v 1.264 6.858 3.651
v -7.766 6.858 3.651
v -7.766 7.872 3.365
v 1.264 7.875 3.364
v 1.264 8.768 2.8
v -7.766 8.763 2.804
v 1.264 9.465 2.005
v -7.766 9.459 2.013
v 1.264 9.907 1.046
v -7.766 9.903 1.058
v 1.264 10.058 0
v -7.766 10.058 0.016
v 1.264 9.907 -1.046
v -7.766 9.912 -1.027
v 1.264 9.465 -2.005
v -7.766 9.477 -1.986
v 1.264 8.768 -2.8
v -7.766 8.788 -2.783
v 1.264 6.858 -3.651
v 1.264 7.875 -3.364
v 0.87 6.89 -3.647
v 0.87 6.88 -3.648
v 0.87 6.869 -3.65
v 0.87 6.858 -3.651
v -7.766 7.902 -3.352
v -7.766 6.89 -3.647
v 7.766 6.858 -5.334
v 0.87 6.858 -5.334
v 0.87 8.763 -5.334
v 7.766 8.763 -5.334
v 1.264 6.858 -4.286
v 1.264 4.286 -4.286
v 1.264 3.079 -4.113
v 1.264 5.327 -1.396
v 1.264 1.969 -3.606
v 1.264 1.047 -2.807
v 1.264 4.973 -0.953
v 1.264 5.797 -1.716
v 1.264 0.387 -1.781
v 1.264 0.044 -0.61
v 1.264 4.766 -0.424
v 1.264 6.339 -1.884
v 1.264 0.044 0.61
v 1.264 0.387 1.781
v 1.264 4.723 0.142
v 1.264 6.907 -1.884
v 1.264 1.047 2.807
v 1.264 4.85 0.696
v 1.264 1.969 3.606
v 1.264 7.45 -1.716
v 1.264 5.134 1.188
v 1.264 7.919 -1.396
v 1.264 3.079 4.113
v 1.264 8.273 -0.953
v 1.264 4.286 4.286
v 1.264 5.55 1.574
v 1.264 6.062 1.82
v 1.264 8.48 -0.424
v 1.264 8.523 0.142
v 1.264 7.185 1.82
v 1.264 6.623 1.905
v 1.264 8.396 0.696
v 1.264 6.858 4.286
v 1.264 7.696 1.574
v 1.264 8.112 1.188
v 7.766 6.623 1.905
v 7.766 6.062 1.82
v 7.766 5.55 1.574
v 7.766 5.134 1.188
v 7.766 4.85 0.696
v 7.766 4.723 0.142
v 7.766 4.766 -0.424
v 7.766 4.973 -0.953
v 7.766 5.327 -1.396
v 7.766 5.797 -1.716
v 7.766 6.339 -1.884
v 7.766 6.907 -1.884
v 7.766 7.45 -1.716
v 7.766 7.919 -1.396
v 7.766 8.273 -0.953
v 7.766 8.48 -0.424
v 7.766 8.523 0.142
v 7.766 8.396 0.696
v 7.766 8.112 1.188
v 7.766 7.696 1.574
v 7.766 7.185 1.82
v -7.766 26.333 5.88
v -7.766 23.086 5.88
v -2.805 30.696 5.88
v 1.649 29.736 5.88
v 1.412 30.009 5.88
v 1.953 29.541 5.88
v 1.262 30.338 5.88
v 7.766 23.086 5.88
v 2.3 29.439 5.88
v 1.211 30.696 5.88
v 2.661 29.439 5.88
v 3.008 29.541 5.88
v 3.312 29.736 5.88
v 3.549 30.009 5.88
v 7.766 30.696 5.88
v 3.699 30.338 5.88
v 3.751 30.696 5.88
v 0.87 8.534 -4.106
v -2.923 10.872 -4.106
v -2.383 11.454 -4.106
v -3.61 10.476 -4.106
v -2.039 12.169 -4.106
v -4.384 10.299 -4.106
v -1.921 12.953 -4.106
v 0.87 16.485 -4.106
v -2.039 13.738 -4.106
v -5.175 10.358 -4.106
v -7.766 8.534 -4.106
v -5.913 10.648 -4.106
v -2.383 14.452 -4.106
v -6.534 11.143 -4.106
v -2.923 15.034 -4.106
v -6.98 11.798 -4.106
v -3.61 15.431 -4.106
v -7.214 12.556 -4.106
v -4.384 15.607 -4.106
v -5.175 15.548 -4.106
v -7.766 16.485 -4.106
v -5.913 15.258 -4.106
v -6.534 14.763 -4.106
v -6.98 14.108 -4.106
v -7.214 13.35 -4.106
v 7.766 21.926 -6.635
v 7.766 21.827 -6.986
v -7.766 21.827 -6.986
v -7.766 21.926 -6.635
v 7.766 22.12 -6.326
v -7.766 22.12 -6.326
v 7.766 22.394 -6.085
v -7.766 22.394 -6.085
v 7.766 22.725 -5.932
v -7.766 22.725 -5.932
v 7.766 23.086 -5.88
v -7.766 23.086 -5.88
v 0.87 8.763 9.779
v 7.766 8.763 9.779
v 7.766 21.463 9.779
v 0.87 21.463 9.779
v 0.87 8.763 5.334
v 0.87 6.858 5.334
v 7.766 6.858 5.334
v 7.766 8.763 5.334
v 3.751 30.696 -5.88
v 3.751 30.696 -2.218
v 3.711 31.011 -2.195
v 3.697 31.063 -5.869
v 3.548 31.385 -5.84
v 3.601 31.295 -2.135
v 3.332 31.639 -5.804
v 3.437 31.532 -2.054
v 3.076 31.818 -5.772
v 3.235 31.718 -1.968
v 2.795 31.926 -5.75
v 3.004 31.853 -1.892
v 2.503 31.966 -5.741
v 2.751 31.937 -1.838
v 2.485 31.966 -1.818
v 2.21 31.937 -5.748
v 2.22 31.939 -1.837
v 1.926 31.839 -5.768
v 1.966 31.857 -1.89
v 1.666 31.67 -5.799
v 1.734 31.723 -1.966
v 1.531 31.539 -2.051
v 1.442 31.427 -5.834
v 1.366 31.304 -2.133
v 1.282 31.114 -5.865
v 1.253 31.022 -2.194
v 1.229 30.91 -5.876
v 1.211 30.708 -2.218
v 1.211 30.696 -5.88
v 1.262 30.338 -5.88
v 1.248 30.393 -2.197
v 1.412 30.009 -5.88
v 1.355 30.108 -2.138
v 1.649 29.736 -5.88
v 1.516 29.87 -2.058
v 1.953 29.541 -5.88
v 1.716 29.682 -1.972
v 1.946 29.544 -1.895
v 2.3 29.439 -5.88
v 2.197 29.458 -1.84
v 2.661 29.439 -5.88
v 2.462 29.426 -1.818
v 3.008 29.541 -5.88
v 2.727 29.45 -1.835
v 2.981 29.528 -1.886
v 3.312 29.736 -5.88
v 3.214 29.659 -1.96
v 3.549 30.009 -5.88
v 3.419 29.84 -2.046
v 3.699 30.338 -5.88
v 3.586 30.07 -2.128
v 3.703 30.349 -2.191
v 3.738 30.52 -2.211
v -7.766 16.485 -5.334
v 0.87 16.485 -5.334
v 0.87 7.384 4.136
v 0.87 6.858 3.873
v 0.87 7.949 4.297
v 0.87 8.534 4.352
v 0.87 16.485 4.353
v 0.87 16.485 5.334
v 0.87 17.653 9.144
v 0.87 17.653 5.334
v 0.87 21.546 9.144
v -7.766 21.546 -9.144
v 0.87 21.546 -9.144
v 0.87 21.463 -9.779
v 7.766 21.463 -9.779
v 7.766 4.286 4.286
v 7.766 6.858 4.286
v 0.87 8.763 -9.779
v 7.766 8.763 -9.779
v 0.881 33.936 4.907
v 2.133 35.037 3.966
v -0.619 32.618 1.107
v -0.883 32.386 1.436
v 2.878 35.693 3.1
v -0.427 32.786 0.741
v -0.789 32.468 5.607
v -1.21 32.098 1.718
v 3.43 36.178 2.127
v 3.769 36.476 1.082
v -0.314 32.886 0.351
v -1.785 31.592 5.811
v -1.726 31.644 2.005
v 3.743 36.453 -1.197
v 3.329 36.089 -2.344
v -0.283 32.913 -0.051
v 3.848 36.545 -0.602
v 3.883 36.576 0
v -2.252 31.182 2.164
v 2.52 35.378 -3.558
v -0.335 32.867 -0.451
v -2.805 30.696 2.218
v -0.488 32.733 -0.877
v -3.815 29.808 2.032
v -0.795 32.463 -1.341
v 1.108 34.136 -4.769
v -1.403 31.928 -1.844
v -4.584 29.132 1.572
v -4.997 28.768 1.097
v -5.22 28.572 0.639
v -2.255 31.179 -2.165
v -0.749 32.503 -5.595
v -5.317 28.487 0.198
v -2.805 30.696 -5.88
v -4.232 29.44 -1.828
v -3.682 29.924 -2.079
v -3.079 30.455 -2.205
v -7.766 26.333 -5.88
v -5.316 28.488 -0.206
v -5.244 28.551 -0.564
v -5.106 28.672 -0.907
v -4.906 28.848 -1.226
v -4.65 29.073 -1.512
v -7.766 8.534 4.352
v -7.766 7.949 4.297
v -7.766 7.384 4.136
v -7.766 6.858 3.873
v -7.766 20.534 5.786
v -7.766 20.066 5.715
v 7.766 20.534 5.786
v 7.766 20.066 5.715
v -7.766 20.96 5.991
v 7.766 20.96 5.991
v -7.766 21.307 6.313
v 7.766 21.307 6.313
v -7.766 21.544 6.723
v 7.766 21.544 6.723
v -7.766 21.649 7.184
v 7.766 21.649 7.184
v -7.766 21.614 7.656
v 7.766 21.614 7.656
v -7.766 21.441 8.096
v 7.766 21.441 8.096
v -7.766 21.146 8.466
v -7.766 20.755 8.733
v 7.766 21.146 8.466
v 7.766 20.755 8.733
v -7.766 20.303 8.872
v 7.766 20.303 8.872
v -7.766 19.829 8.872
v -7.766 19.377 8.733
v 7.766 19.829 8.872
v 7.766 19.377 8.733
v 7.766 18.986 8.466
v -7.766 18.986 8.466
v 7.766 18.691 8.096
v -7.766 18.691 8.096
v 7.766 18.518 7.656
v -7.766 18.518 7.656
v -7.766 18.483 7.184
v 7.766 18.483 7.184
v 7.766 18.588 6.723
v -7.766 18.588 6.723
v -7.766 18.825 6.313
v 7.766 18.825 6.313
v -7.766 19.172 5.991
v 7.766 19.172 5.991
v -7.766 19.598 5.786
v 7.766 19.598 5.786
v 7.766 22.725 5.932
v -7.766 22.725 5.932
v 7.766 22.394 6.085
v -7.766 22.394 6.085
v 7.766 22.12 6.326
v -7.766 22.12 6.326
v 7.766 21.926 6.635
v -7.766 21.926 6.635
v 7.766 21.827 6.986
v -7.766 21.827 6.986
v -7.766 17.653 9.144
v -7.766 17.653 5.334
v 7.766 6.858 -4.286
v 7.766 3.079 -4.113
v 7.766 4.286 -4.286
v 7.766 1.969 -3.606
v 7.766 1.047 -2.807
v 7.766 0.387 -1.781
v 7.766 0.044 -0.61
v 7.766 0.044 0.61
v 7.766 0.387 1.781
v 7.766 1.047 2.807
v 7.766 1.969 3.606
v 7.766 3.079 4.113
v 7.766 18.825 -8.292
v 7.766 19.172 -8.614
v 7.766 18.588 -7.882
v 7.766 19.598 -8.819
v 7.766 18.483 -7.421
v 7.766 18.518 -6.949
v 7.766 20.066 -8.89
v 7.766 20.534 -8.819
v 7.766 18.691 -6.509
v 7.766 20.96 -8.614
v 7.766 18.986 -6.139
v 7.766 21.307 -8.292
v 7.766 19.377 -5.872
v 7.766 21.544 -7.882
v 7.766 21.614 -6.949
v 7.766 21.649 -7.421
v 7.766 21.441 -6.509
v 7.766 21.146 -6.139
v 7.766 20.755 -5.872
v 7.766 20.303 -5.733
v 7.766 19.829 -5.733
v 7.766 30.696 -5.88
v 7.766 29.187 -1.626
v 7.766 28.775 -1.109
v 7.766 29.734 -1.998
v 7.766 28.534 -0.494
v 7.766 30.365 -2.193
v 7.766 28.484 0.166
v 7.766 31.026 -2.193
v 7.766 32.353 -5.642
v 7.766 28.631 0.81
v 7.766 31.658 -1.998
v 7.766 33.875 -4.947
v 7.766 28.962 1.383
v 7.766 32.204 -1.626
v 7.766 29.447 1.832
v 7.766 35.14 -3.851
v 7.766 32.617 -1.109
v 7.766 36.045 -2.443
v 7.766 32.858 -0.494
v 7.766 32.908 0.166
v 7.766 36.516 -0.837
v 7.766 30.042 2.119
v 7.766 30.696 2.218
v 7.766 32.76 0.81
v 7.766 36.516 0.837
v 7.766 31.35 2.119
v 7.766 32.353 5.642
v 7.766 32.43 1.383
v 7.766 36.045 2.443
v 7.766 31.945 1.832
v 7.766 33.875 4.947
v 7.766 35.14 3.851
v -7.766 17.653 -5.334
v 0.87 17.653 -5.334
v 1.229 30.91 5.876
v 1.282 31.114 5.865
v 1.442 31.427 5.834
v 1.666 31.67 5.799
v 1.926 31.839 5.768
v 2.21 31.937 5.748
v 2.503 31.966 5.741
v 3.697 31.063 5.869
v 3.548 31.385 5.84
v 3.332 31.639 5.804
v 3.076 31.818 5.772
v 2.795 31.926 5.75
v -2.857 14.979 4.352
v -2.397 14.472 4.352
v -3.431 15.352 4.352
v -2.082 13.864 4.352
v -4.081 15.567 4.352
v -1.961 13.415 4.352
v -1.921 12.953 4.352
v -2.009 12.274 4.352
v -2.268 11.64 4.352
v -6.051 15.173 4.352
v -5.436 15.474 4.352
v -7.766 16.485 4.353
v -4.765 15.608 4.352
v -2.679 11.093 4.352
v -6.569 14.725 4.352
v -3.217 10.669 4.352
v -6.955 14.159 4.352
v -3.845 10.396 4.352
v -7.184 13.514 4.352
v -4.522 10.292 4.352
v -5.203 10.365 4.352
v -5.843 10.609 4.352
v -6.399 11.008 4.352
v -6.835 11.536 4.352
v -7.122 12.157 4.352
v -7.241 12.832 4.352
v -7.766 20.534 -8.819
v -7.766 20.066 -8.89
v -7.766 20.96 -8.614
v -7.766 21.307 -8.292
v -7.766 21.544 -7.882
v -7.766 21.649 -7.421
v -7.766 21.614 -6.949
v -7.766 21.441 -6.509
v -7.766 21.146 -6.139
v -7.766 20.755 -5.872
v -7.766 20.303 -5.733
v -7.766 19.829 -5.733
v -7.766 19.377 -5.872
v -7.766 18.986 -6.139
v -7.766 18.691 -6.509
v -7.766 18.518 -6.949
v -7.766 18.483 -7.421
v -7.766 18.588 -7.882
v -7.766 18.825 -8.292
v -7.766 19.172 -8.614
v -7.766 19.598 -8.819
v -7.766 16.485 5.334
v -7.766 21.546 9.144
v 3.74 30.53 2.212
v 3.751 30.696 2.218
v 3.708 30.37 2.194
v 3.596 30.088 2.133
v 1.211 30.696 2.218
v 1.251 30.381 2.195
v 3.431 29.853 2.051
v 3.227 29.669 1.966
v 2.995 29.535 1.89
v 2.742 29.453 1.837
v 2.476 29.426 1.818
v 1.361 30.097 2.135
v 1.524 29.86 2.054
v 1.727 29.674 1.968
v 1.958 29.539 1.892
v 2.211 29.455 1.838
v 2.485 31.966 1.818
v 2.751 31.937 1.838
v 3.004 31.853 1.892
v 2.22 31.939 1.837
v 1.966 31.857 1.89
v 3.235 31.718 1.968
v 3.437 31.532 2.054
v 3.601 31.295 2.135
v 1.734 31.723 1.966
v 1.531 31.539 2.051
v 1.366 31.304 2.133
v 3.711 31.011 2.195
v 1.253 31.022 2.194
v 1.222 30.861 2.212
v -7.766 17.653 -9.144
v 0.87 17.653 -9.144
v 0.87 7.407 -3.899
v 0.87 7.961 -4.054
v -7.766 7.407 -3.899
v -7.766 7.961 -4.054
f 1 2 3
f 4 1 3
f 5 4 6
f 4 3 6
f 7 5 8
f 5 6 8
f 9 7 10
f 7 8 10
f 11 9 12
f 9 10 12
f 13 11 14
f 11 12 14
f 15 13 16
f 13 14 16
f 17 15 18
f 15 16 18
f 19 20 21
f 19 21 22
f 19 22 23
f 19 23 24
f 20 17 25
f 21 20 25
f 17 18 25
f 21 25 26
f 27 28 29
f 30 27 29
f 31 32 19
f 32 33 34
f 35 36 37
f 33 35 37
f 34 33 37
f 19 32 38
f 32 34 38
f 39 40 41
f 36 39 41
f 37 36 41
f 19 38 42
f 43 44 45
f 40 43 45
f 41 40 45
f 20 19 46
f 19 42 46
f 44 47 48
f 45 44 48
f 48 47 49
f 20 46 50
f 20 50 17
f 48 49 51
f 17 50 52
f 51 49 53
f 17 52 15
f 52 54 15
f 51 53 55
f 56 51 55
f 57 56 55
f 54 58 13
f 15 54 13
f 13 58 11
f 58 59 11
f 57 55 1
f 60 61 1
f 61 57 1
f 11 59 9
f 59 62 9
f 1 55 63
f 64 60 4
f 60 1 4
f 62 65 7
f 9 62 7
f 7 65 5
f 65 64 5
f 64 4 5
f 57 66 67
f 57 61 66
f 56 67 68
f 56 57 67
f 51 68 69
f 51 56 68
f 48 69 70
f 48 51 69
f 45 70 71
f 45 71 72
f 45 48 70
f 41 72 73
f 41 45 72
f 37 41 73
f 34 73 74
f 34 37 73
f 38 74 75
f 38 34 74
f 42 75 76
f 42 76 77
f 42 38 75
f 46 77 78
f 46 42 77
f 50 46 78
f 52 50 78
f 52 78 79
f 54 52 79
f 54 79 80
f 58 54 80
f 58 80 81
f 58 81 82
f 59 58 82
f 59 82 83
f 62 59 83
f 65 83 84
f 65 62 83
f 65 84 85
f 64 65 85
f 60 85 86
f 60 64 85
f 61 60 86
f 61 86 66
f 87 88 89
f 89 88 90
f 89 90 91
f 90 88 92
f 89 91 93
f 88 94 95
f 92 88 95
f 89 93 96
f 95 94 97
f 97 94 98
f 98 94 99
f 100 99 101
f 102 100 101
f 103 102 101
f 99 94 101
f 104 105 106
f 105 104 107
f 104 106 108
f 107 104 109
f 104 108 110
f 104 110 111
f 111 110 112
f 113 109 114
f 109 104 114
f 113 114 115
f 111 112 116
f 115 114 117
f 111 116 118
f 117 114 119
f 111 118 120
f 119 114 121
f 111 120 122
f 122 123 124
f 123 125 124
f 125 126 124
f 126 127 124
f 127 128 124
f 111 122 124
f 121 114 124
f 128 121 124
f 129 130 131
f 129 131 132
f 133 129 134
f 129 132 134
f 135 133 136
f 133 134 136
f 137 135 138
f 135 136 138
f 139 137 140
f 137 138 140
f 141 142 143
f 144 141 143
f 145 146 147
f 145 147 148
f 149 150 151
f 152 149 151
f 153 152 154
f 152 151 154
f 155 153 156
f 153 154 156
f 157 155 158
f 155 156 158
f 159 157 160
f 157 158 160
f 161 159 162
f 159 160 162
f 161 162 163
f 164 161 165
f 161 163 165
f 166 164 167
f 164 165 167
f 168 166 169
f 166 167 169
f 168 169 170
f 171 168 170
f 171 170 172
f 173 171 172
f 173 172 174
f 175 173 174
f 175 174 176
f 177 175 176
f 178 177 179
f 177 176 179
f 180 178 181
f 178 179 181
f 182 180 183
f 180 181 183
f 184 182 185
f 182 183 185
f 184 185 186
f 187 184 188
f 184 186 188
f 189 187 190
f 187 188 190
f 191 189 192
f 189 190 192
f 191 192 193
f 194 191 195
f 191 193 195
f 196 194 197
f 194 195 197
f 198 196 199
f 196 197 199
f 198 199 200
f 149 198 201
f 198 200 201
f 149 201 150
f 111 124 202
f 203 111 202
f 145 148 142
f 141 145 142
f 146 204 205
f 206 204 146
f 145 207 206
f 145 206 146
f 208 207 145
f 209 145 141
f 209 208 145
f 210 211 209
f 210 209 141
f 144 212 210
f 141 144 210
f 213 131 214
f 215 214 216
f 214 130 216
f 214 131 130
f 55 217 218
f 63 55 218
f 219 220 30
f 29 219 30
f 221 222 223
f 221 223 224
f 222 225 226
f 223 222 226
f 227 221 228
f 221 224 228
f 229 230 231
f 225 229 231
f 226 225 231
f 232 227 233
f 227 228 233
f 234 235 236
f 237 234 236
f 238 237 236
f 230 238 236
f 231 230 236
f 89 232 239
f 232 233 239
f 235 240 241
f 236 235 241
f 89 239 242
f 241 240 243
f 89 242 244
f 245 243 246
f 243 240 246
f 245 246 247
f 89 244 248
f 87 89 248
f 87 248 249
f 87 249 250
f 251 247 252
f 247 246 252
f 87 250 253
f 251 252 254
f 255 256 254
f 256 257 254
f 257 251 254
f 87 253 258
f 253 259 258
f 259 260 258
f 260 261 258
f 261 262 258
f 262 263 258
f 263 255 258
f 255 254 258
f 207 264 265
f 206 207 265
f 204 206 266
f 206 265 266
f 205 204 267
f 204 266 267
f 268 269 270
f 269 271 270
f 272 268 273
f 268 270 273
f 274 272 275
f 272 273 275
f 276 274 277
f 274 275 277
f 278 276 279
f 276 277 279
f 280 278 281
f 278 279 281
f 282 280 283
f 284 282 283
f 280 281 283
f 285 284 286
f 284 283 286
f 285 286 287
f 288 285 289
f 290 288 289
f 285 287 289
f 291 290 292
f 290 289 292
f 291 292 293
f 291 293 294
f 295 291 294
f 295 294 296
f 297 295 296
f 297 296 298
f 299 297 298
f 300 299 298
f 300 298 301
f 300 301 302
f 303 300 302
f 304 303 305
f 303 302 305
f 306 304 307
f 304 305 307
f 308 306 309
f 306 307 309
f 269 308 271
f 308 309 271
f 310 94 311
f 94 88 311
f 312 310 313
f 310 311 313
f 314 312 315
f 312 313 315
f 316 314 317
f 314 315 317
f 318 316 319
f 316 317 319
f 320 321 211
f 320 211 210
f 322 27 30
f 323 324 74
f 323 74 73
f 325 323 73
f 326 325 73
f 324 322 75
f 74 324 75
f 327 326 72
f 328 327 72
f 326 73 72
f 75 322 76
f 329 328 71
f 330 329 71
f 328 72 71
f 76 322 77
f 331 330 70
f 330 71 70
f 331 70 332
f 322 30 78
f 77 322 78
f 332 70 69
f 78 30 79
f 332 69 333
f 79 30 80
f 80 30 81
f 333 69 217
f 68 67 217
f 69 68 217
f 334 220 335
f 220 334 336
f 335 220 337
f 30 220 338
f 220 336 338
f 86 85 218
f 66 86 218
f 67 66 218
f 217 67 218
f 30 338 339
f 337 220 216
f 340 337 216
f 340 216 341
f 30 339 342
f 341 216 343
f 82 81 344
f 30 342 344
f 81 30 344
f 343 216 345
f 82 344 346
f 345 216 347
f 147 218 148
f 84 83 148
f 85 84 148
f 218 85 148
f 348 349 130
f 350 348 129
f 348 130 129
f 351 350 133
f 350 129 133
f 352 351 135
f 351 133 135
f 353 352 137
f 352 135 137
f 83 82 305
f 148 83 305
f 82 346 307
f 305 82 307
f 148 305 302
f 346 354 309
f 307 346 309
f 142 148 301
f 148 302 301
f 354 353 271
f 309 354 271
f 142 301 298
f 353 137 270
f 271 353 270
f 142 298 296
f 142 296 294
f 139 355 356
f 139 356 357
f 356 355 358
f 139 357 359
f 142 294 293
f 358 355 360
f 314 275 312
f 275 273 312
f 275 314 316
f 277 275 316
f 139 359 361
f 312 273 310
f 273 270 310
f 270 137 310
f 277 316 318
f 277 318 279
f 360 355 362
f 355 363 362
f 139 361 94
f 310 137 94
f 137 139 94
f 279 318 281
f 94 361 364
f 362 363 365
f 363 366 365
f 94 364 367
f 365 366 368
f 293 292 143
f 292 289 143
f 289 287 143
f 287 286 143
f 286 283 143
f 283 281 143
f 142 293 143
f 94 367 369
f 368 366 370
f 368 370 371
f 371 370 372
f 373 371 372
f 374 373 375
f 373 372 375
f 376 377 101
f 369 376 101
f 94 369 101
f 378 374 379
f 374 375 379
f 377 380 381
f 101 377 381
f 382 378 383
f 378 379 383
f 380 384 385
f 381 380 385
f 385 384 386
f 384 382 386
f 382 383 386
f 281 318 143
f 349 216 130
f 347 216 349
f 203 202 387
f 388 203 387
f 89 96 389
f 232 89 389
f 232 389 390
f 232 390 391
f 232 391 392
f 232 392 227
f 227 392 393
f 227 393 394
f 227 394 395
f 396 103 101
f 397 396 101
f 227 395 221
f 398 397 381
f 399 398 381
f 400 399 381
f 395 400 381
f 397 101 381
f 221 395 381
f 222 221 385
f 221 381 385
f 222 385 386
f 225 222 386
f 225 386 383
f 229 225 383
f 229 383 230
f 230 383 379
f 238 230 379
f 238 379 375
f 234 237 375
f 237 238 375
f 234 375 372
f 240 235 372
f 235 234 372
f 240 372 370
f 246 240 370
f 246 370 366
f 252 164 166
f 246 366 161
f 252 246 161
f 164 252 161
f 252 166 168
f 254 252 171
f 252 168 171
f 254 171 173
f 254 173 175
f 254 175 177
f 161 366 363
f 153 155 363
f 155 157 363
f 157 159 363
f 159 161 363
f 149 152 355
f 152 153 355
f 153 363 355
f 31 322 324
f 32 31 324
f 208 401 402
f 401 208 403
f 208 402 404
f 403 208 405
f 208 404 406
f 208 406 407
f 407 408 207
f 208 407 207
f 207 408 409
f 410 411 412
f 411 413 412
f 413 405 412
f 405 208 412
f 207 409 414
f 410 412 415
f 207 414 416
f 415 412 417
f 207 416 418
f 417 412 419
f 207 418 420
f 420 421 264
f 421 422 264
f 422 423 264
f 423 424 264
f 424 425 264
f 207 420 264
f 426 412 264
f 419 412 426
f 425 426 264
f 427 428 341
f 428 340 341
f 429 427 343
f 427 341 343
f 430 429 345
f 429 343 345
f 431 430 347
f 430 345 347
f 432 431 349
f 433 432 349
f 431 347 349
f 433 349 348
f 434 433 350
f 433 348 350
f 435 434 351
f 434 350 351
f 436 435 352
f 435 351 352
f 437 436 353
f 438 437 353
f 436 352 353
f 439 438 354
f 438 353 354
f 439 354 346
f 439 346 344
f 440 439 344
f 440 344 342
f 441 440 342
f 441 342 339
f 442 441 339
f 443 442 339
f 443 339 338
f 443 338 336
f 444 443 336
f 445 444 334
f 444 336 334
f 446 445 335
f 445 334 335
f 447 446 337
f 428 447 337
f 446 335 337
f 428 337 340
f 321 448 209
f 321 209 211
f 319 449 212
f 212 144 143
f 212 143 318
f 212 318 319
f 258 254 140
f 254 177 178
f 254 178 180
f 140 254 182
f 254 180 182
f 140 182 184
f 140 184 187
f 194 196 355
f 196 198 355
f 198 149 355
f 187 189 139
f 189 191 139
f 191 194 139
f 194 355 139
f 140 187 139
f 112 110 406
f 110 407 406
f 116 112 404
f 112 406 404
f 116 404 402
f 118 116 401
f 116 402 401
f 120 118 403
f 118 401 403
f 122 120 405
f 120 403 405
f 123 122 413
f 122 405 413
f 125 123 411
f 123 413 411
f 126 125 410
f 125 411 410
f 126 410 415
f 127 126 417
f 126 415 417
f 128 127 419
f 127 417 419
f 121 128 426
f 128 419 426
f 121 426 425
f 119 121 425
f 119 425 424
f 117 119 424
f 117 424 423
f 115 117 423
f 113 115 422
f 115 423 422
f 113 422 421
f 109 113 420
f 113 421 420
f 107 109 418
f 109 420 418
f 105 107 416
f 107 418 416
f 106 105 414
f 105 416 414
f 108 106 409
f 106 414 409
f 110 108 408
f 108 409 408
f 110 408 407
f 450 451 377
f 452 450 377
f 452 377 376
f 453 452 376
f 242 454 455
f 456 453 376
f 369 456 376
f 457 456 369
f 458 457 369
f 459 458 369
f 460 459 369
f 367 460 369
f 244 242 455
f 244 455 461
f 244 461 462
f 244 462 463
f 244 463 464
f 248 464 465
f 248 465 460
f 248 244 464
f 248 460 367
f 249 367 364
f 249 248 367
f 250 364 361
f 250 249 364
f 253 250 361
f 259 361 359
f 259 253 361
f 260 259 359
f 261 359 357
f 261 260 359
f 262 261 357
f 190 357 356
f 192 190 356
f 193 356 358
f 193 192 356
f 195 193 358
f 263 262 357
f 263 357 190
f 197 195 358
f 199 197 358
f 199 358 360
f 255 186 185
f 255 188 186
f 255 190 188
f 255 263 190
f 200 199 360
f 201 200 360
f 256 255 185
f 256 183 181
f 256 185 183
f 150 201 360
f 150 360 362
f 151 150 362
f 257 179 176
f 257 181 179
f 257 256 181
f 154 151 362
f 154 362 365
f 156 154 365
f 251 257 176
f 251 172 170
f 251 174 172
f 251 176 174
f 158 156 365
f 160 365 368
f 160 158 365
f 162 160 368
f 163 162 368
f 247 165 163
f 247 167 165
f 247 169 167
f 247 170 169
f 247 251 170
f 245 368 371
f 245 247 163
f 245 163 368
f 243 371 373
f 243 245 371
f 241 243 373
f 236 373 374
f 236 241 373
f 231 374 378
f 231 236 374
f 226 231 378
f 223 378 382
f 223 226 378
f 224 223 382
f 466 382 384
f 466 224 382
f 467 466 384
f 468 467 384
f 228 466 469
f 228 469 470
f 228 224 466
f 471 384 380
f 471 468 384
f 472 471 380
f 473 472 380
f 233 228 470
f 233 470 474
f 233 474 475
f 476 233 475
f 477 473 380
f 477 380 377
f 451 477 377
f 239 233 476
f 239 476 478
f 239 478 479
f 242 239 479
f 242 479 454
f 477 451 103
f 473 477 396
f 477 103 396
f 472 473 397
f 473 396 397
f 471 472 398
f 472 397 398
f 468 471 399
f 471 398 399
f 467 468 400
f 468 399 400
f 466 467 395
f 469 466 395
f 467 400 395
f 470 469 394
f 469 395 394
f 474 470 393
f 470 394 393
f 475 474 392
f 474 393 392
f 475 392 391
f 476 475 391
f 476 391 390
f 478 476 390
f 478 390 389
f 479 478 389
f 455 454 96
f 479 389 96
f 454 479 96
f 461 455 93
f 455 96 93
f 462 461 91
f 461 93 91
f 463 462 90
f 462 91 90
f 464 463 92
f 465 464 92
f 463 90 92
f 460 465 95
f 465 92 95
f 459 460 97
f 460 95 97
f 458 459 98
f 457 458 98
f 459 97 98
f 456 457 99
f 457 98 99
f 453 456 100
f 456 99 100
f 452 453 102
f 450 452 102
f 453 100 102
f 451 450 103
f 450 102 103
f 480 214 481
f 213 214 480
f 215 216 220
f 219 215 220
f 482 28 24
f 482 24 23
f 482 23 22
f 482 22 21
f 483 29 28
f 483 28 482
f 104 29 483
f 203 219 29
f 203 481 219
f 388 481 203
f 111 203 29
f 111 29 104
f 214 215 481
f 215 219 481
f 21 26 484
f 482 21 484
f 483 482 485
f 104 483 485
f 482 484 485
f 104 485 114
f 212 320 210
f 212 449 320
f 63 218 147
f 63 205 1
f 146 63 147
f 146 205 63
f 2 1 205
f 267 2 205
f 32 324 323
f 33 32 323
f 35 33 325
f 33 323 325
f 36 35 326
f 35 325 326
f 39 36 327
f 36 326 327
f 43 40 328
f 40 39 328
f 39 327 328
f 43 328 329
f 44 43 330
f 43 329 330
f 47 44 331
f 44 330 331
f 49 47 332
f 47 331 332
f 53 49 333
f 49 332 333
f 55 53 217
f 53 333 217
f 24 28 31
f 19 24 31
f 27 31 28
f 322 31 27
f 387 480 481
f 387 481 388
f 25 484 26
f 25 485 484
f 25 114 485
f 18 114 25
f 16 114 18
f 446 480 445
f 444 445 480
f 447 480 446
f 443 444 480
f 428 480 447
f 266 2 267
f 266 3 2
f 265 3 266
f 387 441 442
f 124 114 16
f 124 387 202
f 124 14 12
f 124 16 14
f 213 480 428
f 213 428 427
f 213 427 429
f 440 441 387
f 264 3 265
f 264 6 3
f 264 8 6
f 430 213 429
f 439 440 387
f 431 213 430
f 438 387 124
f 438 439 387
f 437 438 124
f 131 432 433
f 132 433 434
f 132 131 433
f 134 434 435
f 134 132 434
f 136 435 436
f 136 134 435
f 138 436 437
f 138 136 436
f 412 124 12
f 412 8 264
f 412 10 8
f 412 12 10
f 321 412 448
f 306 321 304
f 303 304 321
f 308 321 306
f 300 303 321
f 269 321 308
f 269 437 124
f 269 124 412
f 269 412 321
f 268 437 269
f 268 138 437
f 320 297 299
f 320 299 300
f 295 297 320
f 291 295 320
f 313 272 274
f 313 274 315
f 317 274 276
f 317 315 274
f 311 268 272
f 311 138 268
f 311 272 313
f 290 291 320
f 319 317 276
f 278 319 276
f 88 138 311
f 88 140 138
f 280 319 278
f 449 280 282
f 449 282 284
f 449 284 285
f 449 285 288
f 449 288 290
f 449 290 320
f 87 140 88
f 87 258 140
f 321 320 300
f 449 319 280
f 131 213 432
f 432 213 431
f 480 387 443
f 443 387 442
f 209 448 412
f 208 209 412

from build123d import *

# Parameters (mm, degrees)
SKETCH1_R           = 1.905
SKETCH1_R_2         = 2.2178391
BOSS_EXTRUDE1_DEPTH = 7.76605
SKETCH2_W           = 9.0297
SKETCH2_H           = 6.858
CUT_EXTRUDE1_DEPTH  = 7.76605
CUT_EXTRUDE2_DEPTH  = 9.0297
SKETCH5_R           = 1.5875
CUT_EXTRUDE3_DEPTH  = 12.7
FILLET2_R           = 1.27
SKETCH6_W           = 4.445
SKETCH6_H           = 8.89
CUT_EXTRUDE4_DEPTH  = 8.636
SKETCH6_4_W         = 1.04775
SKETCH6_4_H         = 1.905
BOSS_EXTRUDE2_DEPTH = 15.5321
SKETCH7_R           = 2.661534018
CUT_EXTRUDE5_DEPTH  = 12.7
CUT_EXTRUDE6_DEPTH  = 8.636
CUT_EXTRUDE7_DEPTH  = 0.635
CUT_EXTRUDE8_DEPTH  = 0.635
SKETCH11_R          = 1.27
CUT_EXTRUDE9_DEPTH  = 12.7


with BuildPart() as part:
    # Sketch1 → Boss-Extrude1 (new, symmetric)
    with BuildSketch(Plane(origin=(0, 0, 0), x_dir=(0, 0, -1), z_dir=(1, 0, 0))):
        with BuildLine():
            Line((-9.779, 8.763), (-9.779, 21.463))
            Line((-9.779, 21.463), (-5.8801, 21.971))
            Line((-5.8801, 21.971), (-5.8801, 30.6959))
            ThreePointArc((-5.8801, 30.6959), (0, 36.576), (5.8801, 30.6959))
            Line((5.8801, 30.6959), (5.8801, 21.971))
            Line((5.8801, 21.971), (9.779, 21.463))
            Line((9.779, 21.463), (9.779, 8.763))
            Line((9.779, 8.763), (4.28625, 8.763))
            Line((4.28625, 8.763), (4.28625, 4.28625))
            ThreePointArc((4.28625, 4.28625), (0, 0), (-4.28625, 4.28625))
            Line((-4.28625, 4.28625), (-4.28625, 8.763))
            Line((-4.28625, 8.763), (-9.779, 8.763))
        make_face()
        with Locations(Location((0, 6.62305, 0), (0, 0, 180))):
            Circle(SKETCH1_R, mode=Mode.SUBTRACT)
        with Locations(Location((0, 30.6959, 0), (0, 0, 180))):
            Circle(SKETCH1_R_2, mode=Mode.SUBTRACT)
    extrude(amount=BOSS_EXTRUDE1_DEPTH, both=True)

    # Sketch2 → Cut-Extrude1 (cut, symmetric)
    with BuildSketch(Plane.XY):
        Polygon((3.883025, 36.576), (-7.76605, 26.33345), (-11.065137459, 26.33345), (-11.065137459, 37.341338298), align=None)
        with Locations((-3.2512, 3.429)):
            Rectangle(SKETCH2_W, SKETCH2_H)
    extrude(amount=CUT_EXTRUDE1_DEPTH, both=True, mode=Mode.SUBTRACT)

    # Sketch3 → Cut-Extrude2 (cut)
    with BuildSketch(Plane.ZY.offset(7.76605)):
        with BuildLine():
            Line((-3.65125, 6.858), (-3.65125, 3.968410348))
            Line((-3.65125, 3.968410348), (3.65125, 3.968410348))
            Line((3.65125, 3.968410348), (3.65125, 6.858))
            ThreePointArc((3.65125, 6.858), (0, 10.058441778), (-3.65125, 6.858))
        make_face()
    extrude(amount=-CUT_EXTRUDE2_DEPTH, mode=Mode.SUBTRACT)

    # Sketch5 → Cut-Extrude3 (cut, symmetric)
    with BuildSketch(Plane(origin=(0, 0, 0), x_dir=(0, 0, -1), z_dir=(1, 0, 0))):
        with Locations((-7.3025, 20.066)):
            Circle(SKETCH5_R)
        with Locations((7.3025, 20.066)):
            Circle(SKETCH5_R)
    extrude(amount=CUT_EXTRUDE3_DEPTH, both=True, mode=Mode.SUBTRACT)

    # Fillet2
    fillet2_edges = [part.edges().sort_by_distance(p)[0] for p in [
        (0, 21.971, 5.8801),
        (0, 21.971, -5.8801),
    ]]
    fillet(fillet2_edges, radius=FILLET2_R)

    # Sketch6 → Cut-Extrude4 (cut)
    with BuildSketch(Plane.ZY.offset(7.76605)):
        with Locations((-7.5565, 13.208)):
            Rectangle(SKETCH6_W, SKETCH6_H)
        with Locations((7.5565, 13.208)):
            Rectangle(SKETCH6_W, SKETCH6_H)
    extrude(amount=-CUT_EXTRUDE4_DEPTH, mode=Mode.SUBTRACT)

    # Sketch6_4 → Boss-Extrude2 (add)
    with BuildSketch(Plane.ZY.offset(7.76605)):
        with Locations((4.810125, 7.8105)):
            Rectangle(SKETCH6_4_W, SKETCH6_4_H)
        with Locations((-4.810125, 7.8105)):
            Rectangle(SKETCH6_4_W, SKETCH6_4_H)
    extrude(amount=-BOSS_EXTRUDE2_DEPTH)

    # Sketch7 → Cut-Extrude5 (cut, symmetric)
    with BuildSketch(Plane.XY):
        with Locations((-4.582517629, 12.953080778)):
            Circle(SKETCH7_R)
    extrude(amount=CUT_EXTRUDE5_DEPTH, both=True, mode=Mode.SUBTRACT)

    # Sketch8 → Cut-Extrude6 (cut)
    with BuildSketch(Plane.ZY.offset(7.76605)):
        with BuildLine():
            Line((5.334, 6.858), (5.334, 16.484599764))
            Line((5.334, 16.484599764), (4.35251984, 16.484599764))
            Line((4.35251984, 16.484599764), (4.351681885, 8.533646344))
            ThreePointArc((4.351681885, 8.533646344), (4.229677597, 7.662350207), (3.873218976, 6.858))
            Line((3.873218976, 6.858), (4.286179008, 6.858))
            Line((4.286179008, 6.858), (5.334, 6.858))
        make_face()
        with BuildLine():
            Line((-4.10568025, 16.484599736), (-5.334, 16.484599736))
            Line((-5.334, 16.484599736), (-5.334, 6.858))
            Line((-5.334, 6.858), (-3.65125, 6.858))
            ThreePointArc((-3.65125, 6.858), (-3.649079576, 6.874147348), (-3.646837743, 6.890284937))
            ThreePointArc((-3.646837743, 6.890284937), (-3.988818984, 7.680928893), (-4.10568025, 8.534399736))
            Line((-4.10568025, 8.534399736), (-4.10568025, 16.484599736))
        make_face()
    extrude(amount=-CUT_EXTRUDE6_DEPTH, mode=Mode.SUBTRACT)

    # Sketch9 → Cut-Extrude7 (cut)
    with BuildSketch(Plane.XY.offset(9.779)):
        Polygon((-2.899226122, 16.483160278), (0.86995, 16.483160278), (0.86995, 17.653), (-7.76605, 17.653), (-7.76605, 21.463), (0.86995, 21.463), (0.86995, 24.857620894), (-13.663084866, 24.857620894), (-13.663084866, 16.483160278), (-7.00405, 16.483160278), (-3.833922711, 16.483160278), align=None)
        Polygon((-7.76605, 17.653), (0.86995, 17.653), (0.86995, 20.039153951), (0.86995, 21.463), (-7.76605, 21.463), align=None)
    extrude(amount=-CUT_EXTRUDE7_DEPTH, mode=Mode.SUBTRACT)

    # Sketch10 → Cut-Extrude8 (cut)
    with BuildSketch(Plane(origin=(0, 0, -9.779), x_dir=(-1, 0, 0), z_dir=(0, 0, -1))):
        Polygon((3.833922711, 16.483160278), (7.00405, 16.483160278), (13.663084866, 16.483160278), (13.663084866, 24.857620894), (-0.86995, 24.857620894), (-0.86995, 20.039153951), (-0.86995, 17.653), (-0.86995, 16.483160278), (2.899226122, 16.483160278), align=None)
    extrude(amount=-CUT_EXTRUDE8_DEPTH, mode=Mode.SUBTRACT)

    # Sketch11 → Cut-Extrude9 (cut, symmetric)
    with BuildSketch(Plane.XY):
        with Locations((2.480754657, 30.6959)):
            Circle(SKETCH11_R)
    extrude(amount=CUT_EXTRUDE9_DEPTH, both=True, mode=Mode.SUBTRACT)


solid = part.part
